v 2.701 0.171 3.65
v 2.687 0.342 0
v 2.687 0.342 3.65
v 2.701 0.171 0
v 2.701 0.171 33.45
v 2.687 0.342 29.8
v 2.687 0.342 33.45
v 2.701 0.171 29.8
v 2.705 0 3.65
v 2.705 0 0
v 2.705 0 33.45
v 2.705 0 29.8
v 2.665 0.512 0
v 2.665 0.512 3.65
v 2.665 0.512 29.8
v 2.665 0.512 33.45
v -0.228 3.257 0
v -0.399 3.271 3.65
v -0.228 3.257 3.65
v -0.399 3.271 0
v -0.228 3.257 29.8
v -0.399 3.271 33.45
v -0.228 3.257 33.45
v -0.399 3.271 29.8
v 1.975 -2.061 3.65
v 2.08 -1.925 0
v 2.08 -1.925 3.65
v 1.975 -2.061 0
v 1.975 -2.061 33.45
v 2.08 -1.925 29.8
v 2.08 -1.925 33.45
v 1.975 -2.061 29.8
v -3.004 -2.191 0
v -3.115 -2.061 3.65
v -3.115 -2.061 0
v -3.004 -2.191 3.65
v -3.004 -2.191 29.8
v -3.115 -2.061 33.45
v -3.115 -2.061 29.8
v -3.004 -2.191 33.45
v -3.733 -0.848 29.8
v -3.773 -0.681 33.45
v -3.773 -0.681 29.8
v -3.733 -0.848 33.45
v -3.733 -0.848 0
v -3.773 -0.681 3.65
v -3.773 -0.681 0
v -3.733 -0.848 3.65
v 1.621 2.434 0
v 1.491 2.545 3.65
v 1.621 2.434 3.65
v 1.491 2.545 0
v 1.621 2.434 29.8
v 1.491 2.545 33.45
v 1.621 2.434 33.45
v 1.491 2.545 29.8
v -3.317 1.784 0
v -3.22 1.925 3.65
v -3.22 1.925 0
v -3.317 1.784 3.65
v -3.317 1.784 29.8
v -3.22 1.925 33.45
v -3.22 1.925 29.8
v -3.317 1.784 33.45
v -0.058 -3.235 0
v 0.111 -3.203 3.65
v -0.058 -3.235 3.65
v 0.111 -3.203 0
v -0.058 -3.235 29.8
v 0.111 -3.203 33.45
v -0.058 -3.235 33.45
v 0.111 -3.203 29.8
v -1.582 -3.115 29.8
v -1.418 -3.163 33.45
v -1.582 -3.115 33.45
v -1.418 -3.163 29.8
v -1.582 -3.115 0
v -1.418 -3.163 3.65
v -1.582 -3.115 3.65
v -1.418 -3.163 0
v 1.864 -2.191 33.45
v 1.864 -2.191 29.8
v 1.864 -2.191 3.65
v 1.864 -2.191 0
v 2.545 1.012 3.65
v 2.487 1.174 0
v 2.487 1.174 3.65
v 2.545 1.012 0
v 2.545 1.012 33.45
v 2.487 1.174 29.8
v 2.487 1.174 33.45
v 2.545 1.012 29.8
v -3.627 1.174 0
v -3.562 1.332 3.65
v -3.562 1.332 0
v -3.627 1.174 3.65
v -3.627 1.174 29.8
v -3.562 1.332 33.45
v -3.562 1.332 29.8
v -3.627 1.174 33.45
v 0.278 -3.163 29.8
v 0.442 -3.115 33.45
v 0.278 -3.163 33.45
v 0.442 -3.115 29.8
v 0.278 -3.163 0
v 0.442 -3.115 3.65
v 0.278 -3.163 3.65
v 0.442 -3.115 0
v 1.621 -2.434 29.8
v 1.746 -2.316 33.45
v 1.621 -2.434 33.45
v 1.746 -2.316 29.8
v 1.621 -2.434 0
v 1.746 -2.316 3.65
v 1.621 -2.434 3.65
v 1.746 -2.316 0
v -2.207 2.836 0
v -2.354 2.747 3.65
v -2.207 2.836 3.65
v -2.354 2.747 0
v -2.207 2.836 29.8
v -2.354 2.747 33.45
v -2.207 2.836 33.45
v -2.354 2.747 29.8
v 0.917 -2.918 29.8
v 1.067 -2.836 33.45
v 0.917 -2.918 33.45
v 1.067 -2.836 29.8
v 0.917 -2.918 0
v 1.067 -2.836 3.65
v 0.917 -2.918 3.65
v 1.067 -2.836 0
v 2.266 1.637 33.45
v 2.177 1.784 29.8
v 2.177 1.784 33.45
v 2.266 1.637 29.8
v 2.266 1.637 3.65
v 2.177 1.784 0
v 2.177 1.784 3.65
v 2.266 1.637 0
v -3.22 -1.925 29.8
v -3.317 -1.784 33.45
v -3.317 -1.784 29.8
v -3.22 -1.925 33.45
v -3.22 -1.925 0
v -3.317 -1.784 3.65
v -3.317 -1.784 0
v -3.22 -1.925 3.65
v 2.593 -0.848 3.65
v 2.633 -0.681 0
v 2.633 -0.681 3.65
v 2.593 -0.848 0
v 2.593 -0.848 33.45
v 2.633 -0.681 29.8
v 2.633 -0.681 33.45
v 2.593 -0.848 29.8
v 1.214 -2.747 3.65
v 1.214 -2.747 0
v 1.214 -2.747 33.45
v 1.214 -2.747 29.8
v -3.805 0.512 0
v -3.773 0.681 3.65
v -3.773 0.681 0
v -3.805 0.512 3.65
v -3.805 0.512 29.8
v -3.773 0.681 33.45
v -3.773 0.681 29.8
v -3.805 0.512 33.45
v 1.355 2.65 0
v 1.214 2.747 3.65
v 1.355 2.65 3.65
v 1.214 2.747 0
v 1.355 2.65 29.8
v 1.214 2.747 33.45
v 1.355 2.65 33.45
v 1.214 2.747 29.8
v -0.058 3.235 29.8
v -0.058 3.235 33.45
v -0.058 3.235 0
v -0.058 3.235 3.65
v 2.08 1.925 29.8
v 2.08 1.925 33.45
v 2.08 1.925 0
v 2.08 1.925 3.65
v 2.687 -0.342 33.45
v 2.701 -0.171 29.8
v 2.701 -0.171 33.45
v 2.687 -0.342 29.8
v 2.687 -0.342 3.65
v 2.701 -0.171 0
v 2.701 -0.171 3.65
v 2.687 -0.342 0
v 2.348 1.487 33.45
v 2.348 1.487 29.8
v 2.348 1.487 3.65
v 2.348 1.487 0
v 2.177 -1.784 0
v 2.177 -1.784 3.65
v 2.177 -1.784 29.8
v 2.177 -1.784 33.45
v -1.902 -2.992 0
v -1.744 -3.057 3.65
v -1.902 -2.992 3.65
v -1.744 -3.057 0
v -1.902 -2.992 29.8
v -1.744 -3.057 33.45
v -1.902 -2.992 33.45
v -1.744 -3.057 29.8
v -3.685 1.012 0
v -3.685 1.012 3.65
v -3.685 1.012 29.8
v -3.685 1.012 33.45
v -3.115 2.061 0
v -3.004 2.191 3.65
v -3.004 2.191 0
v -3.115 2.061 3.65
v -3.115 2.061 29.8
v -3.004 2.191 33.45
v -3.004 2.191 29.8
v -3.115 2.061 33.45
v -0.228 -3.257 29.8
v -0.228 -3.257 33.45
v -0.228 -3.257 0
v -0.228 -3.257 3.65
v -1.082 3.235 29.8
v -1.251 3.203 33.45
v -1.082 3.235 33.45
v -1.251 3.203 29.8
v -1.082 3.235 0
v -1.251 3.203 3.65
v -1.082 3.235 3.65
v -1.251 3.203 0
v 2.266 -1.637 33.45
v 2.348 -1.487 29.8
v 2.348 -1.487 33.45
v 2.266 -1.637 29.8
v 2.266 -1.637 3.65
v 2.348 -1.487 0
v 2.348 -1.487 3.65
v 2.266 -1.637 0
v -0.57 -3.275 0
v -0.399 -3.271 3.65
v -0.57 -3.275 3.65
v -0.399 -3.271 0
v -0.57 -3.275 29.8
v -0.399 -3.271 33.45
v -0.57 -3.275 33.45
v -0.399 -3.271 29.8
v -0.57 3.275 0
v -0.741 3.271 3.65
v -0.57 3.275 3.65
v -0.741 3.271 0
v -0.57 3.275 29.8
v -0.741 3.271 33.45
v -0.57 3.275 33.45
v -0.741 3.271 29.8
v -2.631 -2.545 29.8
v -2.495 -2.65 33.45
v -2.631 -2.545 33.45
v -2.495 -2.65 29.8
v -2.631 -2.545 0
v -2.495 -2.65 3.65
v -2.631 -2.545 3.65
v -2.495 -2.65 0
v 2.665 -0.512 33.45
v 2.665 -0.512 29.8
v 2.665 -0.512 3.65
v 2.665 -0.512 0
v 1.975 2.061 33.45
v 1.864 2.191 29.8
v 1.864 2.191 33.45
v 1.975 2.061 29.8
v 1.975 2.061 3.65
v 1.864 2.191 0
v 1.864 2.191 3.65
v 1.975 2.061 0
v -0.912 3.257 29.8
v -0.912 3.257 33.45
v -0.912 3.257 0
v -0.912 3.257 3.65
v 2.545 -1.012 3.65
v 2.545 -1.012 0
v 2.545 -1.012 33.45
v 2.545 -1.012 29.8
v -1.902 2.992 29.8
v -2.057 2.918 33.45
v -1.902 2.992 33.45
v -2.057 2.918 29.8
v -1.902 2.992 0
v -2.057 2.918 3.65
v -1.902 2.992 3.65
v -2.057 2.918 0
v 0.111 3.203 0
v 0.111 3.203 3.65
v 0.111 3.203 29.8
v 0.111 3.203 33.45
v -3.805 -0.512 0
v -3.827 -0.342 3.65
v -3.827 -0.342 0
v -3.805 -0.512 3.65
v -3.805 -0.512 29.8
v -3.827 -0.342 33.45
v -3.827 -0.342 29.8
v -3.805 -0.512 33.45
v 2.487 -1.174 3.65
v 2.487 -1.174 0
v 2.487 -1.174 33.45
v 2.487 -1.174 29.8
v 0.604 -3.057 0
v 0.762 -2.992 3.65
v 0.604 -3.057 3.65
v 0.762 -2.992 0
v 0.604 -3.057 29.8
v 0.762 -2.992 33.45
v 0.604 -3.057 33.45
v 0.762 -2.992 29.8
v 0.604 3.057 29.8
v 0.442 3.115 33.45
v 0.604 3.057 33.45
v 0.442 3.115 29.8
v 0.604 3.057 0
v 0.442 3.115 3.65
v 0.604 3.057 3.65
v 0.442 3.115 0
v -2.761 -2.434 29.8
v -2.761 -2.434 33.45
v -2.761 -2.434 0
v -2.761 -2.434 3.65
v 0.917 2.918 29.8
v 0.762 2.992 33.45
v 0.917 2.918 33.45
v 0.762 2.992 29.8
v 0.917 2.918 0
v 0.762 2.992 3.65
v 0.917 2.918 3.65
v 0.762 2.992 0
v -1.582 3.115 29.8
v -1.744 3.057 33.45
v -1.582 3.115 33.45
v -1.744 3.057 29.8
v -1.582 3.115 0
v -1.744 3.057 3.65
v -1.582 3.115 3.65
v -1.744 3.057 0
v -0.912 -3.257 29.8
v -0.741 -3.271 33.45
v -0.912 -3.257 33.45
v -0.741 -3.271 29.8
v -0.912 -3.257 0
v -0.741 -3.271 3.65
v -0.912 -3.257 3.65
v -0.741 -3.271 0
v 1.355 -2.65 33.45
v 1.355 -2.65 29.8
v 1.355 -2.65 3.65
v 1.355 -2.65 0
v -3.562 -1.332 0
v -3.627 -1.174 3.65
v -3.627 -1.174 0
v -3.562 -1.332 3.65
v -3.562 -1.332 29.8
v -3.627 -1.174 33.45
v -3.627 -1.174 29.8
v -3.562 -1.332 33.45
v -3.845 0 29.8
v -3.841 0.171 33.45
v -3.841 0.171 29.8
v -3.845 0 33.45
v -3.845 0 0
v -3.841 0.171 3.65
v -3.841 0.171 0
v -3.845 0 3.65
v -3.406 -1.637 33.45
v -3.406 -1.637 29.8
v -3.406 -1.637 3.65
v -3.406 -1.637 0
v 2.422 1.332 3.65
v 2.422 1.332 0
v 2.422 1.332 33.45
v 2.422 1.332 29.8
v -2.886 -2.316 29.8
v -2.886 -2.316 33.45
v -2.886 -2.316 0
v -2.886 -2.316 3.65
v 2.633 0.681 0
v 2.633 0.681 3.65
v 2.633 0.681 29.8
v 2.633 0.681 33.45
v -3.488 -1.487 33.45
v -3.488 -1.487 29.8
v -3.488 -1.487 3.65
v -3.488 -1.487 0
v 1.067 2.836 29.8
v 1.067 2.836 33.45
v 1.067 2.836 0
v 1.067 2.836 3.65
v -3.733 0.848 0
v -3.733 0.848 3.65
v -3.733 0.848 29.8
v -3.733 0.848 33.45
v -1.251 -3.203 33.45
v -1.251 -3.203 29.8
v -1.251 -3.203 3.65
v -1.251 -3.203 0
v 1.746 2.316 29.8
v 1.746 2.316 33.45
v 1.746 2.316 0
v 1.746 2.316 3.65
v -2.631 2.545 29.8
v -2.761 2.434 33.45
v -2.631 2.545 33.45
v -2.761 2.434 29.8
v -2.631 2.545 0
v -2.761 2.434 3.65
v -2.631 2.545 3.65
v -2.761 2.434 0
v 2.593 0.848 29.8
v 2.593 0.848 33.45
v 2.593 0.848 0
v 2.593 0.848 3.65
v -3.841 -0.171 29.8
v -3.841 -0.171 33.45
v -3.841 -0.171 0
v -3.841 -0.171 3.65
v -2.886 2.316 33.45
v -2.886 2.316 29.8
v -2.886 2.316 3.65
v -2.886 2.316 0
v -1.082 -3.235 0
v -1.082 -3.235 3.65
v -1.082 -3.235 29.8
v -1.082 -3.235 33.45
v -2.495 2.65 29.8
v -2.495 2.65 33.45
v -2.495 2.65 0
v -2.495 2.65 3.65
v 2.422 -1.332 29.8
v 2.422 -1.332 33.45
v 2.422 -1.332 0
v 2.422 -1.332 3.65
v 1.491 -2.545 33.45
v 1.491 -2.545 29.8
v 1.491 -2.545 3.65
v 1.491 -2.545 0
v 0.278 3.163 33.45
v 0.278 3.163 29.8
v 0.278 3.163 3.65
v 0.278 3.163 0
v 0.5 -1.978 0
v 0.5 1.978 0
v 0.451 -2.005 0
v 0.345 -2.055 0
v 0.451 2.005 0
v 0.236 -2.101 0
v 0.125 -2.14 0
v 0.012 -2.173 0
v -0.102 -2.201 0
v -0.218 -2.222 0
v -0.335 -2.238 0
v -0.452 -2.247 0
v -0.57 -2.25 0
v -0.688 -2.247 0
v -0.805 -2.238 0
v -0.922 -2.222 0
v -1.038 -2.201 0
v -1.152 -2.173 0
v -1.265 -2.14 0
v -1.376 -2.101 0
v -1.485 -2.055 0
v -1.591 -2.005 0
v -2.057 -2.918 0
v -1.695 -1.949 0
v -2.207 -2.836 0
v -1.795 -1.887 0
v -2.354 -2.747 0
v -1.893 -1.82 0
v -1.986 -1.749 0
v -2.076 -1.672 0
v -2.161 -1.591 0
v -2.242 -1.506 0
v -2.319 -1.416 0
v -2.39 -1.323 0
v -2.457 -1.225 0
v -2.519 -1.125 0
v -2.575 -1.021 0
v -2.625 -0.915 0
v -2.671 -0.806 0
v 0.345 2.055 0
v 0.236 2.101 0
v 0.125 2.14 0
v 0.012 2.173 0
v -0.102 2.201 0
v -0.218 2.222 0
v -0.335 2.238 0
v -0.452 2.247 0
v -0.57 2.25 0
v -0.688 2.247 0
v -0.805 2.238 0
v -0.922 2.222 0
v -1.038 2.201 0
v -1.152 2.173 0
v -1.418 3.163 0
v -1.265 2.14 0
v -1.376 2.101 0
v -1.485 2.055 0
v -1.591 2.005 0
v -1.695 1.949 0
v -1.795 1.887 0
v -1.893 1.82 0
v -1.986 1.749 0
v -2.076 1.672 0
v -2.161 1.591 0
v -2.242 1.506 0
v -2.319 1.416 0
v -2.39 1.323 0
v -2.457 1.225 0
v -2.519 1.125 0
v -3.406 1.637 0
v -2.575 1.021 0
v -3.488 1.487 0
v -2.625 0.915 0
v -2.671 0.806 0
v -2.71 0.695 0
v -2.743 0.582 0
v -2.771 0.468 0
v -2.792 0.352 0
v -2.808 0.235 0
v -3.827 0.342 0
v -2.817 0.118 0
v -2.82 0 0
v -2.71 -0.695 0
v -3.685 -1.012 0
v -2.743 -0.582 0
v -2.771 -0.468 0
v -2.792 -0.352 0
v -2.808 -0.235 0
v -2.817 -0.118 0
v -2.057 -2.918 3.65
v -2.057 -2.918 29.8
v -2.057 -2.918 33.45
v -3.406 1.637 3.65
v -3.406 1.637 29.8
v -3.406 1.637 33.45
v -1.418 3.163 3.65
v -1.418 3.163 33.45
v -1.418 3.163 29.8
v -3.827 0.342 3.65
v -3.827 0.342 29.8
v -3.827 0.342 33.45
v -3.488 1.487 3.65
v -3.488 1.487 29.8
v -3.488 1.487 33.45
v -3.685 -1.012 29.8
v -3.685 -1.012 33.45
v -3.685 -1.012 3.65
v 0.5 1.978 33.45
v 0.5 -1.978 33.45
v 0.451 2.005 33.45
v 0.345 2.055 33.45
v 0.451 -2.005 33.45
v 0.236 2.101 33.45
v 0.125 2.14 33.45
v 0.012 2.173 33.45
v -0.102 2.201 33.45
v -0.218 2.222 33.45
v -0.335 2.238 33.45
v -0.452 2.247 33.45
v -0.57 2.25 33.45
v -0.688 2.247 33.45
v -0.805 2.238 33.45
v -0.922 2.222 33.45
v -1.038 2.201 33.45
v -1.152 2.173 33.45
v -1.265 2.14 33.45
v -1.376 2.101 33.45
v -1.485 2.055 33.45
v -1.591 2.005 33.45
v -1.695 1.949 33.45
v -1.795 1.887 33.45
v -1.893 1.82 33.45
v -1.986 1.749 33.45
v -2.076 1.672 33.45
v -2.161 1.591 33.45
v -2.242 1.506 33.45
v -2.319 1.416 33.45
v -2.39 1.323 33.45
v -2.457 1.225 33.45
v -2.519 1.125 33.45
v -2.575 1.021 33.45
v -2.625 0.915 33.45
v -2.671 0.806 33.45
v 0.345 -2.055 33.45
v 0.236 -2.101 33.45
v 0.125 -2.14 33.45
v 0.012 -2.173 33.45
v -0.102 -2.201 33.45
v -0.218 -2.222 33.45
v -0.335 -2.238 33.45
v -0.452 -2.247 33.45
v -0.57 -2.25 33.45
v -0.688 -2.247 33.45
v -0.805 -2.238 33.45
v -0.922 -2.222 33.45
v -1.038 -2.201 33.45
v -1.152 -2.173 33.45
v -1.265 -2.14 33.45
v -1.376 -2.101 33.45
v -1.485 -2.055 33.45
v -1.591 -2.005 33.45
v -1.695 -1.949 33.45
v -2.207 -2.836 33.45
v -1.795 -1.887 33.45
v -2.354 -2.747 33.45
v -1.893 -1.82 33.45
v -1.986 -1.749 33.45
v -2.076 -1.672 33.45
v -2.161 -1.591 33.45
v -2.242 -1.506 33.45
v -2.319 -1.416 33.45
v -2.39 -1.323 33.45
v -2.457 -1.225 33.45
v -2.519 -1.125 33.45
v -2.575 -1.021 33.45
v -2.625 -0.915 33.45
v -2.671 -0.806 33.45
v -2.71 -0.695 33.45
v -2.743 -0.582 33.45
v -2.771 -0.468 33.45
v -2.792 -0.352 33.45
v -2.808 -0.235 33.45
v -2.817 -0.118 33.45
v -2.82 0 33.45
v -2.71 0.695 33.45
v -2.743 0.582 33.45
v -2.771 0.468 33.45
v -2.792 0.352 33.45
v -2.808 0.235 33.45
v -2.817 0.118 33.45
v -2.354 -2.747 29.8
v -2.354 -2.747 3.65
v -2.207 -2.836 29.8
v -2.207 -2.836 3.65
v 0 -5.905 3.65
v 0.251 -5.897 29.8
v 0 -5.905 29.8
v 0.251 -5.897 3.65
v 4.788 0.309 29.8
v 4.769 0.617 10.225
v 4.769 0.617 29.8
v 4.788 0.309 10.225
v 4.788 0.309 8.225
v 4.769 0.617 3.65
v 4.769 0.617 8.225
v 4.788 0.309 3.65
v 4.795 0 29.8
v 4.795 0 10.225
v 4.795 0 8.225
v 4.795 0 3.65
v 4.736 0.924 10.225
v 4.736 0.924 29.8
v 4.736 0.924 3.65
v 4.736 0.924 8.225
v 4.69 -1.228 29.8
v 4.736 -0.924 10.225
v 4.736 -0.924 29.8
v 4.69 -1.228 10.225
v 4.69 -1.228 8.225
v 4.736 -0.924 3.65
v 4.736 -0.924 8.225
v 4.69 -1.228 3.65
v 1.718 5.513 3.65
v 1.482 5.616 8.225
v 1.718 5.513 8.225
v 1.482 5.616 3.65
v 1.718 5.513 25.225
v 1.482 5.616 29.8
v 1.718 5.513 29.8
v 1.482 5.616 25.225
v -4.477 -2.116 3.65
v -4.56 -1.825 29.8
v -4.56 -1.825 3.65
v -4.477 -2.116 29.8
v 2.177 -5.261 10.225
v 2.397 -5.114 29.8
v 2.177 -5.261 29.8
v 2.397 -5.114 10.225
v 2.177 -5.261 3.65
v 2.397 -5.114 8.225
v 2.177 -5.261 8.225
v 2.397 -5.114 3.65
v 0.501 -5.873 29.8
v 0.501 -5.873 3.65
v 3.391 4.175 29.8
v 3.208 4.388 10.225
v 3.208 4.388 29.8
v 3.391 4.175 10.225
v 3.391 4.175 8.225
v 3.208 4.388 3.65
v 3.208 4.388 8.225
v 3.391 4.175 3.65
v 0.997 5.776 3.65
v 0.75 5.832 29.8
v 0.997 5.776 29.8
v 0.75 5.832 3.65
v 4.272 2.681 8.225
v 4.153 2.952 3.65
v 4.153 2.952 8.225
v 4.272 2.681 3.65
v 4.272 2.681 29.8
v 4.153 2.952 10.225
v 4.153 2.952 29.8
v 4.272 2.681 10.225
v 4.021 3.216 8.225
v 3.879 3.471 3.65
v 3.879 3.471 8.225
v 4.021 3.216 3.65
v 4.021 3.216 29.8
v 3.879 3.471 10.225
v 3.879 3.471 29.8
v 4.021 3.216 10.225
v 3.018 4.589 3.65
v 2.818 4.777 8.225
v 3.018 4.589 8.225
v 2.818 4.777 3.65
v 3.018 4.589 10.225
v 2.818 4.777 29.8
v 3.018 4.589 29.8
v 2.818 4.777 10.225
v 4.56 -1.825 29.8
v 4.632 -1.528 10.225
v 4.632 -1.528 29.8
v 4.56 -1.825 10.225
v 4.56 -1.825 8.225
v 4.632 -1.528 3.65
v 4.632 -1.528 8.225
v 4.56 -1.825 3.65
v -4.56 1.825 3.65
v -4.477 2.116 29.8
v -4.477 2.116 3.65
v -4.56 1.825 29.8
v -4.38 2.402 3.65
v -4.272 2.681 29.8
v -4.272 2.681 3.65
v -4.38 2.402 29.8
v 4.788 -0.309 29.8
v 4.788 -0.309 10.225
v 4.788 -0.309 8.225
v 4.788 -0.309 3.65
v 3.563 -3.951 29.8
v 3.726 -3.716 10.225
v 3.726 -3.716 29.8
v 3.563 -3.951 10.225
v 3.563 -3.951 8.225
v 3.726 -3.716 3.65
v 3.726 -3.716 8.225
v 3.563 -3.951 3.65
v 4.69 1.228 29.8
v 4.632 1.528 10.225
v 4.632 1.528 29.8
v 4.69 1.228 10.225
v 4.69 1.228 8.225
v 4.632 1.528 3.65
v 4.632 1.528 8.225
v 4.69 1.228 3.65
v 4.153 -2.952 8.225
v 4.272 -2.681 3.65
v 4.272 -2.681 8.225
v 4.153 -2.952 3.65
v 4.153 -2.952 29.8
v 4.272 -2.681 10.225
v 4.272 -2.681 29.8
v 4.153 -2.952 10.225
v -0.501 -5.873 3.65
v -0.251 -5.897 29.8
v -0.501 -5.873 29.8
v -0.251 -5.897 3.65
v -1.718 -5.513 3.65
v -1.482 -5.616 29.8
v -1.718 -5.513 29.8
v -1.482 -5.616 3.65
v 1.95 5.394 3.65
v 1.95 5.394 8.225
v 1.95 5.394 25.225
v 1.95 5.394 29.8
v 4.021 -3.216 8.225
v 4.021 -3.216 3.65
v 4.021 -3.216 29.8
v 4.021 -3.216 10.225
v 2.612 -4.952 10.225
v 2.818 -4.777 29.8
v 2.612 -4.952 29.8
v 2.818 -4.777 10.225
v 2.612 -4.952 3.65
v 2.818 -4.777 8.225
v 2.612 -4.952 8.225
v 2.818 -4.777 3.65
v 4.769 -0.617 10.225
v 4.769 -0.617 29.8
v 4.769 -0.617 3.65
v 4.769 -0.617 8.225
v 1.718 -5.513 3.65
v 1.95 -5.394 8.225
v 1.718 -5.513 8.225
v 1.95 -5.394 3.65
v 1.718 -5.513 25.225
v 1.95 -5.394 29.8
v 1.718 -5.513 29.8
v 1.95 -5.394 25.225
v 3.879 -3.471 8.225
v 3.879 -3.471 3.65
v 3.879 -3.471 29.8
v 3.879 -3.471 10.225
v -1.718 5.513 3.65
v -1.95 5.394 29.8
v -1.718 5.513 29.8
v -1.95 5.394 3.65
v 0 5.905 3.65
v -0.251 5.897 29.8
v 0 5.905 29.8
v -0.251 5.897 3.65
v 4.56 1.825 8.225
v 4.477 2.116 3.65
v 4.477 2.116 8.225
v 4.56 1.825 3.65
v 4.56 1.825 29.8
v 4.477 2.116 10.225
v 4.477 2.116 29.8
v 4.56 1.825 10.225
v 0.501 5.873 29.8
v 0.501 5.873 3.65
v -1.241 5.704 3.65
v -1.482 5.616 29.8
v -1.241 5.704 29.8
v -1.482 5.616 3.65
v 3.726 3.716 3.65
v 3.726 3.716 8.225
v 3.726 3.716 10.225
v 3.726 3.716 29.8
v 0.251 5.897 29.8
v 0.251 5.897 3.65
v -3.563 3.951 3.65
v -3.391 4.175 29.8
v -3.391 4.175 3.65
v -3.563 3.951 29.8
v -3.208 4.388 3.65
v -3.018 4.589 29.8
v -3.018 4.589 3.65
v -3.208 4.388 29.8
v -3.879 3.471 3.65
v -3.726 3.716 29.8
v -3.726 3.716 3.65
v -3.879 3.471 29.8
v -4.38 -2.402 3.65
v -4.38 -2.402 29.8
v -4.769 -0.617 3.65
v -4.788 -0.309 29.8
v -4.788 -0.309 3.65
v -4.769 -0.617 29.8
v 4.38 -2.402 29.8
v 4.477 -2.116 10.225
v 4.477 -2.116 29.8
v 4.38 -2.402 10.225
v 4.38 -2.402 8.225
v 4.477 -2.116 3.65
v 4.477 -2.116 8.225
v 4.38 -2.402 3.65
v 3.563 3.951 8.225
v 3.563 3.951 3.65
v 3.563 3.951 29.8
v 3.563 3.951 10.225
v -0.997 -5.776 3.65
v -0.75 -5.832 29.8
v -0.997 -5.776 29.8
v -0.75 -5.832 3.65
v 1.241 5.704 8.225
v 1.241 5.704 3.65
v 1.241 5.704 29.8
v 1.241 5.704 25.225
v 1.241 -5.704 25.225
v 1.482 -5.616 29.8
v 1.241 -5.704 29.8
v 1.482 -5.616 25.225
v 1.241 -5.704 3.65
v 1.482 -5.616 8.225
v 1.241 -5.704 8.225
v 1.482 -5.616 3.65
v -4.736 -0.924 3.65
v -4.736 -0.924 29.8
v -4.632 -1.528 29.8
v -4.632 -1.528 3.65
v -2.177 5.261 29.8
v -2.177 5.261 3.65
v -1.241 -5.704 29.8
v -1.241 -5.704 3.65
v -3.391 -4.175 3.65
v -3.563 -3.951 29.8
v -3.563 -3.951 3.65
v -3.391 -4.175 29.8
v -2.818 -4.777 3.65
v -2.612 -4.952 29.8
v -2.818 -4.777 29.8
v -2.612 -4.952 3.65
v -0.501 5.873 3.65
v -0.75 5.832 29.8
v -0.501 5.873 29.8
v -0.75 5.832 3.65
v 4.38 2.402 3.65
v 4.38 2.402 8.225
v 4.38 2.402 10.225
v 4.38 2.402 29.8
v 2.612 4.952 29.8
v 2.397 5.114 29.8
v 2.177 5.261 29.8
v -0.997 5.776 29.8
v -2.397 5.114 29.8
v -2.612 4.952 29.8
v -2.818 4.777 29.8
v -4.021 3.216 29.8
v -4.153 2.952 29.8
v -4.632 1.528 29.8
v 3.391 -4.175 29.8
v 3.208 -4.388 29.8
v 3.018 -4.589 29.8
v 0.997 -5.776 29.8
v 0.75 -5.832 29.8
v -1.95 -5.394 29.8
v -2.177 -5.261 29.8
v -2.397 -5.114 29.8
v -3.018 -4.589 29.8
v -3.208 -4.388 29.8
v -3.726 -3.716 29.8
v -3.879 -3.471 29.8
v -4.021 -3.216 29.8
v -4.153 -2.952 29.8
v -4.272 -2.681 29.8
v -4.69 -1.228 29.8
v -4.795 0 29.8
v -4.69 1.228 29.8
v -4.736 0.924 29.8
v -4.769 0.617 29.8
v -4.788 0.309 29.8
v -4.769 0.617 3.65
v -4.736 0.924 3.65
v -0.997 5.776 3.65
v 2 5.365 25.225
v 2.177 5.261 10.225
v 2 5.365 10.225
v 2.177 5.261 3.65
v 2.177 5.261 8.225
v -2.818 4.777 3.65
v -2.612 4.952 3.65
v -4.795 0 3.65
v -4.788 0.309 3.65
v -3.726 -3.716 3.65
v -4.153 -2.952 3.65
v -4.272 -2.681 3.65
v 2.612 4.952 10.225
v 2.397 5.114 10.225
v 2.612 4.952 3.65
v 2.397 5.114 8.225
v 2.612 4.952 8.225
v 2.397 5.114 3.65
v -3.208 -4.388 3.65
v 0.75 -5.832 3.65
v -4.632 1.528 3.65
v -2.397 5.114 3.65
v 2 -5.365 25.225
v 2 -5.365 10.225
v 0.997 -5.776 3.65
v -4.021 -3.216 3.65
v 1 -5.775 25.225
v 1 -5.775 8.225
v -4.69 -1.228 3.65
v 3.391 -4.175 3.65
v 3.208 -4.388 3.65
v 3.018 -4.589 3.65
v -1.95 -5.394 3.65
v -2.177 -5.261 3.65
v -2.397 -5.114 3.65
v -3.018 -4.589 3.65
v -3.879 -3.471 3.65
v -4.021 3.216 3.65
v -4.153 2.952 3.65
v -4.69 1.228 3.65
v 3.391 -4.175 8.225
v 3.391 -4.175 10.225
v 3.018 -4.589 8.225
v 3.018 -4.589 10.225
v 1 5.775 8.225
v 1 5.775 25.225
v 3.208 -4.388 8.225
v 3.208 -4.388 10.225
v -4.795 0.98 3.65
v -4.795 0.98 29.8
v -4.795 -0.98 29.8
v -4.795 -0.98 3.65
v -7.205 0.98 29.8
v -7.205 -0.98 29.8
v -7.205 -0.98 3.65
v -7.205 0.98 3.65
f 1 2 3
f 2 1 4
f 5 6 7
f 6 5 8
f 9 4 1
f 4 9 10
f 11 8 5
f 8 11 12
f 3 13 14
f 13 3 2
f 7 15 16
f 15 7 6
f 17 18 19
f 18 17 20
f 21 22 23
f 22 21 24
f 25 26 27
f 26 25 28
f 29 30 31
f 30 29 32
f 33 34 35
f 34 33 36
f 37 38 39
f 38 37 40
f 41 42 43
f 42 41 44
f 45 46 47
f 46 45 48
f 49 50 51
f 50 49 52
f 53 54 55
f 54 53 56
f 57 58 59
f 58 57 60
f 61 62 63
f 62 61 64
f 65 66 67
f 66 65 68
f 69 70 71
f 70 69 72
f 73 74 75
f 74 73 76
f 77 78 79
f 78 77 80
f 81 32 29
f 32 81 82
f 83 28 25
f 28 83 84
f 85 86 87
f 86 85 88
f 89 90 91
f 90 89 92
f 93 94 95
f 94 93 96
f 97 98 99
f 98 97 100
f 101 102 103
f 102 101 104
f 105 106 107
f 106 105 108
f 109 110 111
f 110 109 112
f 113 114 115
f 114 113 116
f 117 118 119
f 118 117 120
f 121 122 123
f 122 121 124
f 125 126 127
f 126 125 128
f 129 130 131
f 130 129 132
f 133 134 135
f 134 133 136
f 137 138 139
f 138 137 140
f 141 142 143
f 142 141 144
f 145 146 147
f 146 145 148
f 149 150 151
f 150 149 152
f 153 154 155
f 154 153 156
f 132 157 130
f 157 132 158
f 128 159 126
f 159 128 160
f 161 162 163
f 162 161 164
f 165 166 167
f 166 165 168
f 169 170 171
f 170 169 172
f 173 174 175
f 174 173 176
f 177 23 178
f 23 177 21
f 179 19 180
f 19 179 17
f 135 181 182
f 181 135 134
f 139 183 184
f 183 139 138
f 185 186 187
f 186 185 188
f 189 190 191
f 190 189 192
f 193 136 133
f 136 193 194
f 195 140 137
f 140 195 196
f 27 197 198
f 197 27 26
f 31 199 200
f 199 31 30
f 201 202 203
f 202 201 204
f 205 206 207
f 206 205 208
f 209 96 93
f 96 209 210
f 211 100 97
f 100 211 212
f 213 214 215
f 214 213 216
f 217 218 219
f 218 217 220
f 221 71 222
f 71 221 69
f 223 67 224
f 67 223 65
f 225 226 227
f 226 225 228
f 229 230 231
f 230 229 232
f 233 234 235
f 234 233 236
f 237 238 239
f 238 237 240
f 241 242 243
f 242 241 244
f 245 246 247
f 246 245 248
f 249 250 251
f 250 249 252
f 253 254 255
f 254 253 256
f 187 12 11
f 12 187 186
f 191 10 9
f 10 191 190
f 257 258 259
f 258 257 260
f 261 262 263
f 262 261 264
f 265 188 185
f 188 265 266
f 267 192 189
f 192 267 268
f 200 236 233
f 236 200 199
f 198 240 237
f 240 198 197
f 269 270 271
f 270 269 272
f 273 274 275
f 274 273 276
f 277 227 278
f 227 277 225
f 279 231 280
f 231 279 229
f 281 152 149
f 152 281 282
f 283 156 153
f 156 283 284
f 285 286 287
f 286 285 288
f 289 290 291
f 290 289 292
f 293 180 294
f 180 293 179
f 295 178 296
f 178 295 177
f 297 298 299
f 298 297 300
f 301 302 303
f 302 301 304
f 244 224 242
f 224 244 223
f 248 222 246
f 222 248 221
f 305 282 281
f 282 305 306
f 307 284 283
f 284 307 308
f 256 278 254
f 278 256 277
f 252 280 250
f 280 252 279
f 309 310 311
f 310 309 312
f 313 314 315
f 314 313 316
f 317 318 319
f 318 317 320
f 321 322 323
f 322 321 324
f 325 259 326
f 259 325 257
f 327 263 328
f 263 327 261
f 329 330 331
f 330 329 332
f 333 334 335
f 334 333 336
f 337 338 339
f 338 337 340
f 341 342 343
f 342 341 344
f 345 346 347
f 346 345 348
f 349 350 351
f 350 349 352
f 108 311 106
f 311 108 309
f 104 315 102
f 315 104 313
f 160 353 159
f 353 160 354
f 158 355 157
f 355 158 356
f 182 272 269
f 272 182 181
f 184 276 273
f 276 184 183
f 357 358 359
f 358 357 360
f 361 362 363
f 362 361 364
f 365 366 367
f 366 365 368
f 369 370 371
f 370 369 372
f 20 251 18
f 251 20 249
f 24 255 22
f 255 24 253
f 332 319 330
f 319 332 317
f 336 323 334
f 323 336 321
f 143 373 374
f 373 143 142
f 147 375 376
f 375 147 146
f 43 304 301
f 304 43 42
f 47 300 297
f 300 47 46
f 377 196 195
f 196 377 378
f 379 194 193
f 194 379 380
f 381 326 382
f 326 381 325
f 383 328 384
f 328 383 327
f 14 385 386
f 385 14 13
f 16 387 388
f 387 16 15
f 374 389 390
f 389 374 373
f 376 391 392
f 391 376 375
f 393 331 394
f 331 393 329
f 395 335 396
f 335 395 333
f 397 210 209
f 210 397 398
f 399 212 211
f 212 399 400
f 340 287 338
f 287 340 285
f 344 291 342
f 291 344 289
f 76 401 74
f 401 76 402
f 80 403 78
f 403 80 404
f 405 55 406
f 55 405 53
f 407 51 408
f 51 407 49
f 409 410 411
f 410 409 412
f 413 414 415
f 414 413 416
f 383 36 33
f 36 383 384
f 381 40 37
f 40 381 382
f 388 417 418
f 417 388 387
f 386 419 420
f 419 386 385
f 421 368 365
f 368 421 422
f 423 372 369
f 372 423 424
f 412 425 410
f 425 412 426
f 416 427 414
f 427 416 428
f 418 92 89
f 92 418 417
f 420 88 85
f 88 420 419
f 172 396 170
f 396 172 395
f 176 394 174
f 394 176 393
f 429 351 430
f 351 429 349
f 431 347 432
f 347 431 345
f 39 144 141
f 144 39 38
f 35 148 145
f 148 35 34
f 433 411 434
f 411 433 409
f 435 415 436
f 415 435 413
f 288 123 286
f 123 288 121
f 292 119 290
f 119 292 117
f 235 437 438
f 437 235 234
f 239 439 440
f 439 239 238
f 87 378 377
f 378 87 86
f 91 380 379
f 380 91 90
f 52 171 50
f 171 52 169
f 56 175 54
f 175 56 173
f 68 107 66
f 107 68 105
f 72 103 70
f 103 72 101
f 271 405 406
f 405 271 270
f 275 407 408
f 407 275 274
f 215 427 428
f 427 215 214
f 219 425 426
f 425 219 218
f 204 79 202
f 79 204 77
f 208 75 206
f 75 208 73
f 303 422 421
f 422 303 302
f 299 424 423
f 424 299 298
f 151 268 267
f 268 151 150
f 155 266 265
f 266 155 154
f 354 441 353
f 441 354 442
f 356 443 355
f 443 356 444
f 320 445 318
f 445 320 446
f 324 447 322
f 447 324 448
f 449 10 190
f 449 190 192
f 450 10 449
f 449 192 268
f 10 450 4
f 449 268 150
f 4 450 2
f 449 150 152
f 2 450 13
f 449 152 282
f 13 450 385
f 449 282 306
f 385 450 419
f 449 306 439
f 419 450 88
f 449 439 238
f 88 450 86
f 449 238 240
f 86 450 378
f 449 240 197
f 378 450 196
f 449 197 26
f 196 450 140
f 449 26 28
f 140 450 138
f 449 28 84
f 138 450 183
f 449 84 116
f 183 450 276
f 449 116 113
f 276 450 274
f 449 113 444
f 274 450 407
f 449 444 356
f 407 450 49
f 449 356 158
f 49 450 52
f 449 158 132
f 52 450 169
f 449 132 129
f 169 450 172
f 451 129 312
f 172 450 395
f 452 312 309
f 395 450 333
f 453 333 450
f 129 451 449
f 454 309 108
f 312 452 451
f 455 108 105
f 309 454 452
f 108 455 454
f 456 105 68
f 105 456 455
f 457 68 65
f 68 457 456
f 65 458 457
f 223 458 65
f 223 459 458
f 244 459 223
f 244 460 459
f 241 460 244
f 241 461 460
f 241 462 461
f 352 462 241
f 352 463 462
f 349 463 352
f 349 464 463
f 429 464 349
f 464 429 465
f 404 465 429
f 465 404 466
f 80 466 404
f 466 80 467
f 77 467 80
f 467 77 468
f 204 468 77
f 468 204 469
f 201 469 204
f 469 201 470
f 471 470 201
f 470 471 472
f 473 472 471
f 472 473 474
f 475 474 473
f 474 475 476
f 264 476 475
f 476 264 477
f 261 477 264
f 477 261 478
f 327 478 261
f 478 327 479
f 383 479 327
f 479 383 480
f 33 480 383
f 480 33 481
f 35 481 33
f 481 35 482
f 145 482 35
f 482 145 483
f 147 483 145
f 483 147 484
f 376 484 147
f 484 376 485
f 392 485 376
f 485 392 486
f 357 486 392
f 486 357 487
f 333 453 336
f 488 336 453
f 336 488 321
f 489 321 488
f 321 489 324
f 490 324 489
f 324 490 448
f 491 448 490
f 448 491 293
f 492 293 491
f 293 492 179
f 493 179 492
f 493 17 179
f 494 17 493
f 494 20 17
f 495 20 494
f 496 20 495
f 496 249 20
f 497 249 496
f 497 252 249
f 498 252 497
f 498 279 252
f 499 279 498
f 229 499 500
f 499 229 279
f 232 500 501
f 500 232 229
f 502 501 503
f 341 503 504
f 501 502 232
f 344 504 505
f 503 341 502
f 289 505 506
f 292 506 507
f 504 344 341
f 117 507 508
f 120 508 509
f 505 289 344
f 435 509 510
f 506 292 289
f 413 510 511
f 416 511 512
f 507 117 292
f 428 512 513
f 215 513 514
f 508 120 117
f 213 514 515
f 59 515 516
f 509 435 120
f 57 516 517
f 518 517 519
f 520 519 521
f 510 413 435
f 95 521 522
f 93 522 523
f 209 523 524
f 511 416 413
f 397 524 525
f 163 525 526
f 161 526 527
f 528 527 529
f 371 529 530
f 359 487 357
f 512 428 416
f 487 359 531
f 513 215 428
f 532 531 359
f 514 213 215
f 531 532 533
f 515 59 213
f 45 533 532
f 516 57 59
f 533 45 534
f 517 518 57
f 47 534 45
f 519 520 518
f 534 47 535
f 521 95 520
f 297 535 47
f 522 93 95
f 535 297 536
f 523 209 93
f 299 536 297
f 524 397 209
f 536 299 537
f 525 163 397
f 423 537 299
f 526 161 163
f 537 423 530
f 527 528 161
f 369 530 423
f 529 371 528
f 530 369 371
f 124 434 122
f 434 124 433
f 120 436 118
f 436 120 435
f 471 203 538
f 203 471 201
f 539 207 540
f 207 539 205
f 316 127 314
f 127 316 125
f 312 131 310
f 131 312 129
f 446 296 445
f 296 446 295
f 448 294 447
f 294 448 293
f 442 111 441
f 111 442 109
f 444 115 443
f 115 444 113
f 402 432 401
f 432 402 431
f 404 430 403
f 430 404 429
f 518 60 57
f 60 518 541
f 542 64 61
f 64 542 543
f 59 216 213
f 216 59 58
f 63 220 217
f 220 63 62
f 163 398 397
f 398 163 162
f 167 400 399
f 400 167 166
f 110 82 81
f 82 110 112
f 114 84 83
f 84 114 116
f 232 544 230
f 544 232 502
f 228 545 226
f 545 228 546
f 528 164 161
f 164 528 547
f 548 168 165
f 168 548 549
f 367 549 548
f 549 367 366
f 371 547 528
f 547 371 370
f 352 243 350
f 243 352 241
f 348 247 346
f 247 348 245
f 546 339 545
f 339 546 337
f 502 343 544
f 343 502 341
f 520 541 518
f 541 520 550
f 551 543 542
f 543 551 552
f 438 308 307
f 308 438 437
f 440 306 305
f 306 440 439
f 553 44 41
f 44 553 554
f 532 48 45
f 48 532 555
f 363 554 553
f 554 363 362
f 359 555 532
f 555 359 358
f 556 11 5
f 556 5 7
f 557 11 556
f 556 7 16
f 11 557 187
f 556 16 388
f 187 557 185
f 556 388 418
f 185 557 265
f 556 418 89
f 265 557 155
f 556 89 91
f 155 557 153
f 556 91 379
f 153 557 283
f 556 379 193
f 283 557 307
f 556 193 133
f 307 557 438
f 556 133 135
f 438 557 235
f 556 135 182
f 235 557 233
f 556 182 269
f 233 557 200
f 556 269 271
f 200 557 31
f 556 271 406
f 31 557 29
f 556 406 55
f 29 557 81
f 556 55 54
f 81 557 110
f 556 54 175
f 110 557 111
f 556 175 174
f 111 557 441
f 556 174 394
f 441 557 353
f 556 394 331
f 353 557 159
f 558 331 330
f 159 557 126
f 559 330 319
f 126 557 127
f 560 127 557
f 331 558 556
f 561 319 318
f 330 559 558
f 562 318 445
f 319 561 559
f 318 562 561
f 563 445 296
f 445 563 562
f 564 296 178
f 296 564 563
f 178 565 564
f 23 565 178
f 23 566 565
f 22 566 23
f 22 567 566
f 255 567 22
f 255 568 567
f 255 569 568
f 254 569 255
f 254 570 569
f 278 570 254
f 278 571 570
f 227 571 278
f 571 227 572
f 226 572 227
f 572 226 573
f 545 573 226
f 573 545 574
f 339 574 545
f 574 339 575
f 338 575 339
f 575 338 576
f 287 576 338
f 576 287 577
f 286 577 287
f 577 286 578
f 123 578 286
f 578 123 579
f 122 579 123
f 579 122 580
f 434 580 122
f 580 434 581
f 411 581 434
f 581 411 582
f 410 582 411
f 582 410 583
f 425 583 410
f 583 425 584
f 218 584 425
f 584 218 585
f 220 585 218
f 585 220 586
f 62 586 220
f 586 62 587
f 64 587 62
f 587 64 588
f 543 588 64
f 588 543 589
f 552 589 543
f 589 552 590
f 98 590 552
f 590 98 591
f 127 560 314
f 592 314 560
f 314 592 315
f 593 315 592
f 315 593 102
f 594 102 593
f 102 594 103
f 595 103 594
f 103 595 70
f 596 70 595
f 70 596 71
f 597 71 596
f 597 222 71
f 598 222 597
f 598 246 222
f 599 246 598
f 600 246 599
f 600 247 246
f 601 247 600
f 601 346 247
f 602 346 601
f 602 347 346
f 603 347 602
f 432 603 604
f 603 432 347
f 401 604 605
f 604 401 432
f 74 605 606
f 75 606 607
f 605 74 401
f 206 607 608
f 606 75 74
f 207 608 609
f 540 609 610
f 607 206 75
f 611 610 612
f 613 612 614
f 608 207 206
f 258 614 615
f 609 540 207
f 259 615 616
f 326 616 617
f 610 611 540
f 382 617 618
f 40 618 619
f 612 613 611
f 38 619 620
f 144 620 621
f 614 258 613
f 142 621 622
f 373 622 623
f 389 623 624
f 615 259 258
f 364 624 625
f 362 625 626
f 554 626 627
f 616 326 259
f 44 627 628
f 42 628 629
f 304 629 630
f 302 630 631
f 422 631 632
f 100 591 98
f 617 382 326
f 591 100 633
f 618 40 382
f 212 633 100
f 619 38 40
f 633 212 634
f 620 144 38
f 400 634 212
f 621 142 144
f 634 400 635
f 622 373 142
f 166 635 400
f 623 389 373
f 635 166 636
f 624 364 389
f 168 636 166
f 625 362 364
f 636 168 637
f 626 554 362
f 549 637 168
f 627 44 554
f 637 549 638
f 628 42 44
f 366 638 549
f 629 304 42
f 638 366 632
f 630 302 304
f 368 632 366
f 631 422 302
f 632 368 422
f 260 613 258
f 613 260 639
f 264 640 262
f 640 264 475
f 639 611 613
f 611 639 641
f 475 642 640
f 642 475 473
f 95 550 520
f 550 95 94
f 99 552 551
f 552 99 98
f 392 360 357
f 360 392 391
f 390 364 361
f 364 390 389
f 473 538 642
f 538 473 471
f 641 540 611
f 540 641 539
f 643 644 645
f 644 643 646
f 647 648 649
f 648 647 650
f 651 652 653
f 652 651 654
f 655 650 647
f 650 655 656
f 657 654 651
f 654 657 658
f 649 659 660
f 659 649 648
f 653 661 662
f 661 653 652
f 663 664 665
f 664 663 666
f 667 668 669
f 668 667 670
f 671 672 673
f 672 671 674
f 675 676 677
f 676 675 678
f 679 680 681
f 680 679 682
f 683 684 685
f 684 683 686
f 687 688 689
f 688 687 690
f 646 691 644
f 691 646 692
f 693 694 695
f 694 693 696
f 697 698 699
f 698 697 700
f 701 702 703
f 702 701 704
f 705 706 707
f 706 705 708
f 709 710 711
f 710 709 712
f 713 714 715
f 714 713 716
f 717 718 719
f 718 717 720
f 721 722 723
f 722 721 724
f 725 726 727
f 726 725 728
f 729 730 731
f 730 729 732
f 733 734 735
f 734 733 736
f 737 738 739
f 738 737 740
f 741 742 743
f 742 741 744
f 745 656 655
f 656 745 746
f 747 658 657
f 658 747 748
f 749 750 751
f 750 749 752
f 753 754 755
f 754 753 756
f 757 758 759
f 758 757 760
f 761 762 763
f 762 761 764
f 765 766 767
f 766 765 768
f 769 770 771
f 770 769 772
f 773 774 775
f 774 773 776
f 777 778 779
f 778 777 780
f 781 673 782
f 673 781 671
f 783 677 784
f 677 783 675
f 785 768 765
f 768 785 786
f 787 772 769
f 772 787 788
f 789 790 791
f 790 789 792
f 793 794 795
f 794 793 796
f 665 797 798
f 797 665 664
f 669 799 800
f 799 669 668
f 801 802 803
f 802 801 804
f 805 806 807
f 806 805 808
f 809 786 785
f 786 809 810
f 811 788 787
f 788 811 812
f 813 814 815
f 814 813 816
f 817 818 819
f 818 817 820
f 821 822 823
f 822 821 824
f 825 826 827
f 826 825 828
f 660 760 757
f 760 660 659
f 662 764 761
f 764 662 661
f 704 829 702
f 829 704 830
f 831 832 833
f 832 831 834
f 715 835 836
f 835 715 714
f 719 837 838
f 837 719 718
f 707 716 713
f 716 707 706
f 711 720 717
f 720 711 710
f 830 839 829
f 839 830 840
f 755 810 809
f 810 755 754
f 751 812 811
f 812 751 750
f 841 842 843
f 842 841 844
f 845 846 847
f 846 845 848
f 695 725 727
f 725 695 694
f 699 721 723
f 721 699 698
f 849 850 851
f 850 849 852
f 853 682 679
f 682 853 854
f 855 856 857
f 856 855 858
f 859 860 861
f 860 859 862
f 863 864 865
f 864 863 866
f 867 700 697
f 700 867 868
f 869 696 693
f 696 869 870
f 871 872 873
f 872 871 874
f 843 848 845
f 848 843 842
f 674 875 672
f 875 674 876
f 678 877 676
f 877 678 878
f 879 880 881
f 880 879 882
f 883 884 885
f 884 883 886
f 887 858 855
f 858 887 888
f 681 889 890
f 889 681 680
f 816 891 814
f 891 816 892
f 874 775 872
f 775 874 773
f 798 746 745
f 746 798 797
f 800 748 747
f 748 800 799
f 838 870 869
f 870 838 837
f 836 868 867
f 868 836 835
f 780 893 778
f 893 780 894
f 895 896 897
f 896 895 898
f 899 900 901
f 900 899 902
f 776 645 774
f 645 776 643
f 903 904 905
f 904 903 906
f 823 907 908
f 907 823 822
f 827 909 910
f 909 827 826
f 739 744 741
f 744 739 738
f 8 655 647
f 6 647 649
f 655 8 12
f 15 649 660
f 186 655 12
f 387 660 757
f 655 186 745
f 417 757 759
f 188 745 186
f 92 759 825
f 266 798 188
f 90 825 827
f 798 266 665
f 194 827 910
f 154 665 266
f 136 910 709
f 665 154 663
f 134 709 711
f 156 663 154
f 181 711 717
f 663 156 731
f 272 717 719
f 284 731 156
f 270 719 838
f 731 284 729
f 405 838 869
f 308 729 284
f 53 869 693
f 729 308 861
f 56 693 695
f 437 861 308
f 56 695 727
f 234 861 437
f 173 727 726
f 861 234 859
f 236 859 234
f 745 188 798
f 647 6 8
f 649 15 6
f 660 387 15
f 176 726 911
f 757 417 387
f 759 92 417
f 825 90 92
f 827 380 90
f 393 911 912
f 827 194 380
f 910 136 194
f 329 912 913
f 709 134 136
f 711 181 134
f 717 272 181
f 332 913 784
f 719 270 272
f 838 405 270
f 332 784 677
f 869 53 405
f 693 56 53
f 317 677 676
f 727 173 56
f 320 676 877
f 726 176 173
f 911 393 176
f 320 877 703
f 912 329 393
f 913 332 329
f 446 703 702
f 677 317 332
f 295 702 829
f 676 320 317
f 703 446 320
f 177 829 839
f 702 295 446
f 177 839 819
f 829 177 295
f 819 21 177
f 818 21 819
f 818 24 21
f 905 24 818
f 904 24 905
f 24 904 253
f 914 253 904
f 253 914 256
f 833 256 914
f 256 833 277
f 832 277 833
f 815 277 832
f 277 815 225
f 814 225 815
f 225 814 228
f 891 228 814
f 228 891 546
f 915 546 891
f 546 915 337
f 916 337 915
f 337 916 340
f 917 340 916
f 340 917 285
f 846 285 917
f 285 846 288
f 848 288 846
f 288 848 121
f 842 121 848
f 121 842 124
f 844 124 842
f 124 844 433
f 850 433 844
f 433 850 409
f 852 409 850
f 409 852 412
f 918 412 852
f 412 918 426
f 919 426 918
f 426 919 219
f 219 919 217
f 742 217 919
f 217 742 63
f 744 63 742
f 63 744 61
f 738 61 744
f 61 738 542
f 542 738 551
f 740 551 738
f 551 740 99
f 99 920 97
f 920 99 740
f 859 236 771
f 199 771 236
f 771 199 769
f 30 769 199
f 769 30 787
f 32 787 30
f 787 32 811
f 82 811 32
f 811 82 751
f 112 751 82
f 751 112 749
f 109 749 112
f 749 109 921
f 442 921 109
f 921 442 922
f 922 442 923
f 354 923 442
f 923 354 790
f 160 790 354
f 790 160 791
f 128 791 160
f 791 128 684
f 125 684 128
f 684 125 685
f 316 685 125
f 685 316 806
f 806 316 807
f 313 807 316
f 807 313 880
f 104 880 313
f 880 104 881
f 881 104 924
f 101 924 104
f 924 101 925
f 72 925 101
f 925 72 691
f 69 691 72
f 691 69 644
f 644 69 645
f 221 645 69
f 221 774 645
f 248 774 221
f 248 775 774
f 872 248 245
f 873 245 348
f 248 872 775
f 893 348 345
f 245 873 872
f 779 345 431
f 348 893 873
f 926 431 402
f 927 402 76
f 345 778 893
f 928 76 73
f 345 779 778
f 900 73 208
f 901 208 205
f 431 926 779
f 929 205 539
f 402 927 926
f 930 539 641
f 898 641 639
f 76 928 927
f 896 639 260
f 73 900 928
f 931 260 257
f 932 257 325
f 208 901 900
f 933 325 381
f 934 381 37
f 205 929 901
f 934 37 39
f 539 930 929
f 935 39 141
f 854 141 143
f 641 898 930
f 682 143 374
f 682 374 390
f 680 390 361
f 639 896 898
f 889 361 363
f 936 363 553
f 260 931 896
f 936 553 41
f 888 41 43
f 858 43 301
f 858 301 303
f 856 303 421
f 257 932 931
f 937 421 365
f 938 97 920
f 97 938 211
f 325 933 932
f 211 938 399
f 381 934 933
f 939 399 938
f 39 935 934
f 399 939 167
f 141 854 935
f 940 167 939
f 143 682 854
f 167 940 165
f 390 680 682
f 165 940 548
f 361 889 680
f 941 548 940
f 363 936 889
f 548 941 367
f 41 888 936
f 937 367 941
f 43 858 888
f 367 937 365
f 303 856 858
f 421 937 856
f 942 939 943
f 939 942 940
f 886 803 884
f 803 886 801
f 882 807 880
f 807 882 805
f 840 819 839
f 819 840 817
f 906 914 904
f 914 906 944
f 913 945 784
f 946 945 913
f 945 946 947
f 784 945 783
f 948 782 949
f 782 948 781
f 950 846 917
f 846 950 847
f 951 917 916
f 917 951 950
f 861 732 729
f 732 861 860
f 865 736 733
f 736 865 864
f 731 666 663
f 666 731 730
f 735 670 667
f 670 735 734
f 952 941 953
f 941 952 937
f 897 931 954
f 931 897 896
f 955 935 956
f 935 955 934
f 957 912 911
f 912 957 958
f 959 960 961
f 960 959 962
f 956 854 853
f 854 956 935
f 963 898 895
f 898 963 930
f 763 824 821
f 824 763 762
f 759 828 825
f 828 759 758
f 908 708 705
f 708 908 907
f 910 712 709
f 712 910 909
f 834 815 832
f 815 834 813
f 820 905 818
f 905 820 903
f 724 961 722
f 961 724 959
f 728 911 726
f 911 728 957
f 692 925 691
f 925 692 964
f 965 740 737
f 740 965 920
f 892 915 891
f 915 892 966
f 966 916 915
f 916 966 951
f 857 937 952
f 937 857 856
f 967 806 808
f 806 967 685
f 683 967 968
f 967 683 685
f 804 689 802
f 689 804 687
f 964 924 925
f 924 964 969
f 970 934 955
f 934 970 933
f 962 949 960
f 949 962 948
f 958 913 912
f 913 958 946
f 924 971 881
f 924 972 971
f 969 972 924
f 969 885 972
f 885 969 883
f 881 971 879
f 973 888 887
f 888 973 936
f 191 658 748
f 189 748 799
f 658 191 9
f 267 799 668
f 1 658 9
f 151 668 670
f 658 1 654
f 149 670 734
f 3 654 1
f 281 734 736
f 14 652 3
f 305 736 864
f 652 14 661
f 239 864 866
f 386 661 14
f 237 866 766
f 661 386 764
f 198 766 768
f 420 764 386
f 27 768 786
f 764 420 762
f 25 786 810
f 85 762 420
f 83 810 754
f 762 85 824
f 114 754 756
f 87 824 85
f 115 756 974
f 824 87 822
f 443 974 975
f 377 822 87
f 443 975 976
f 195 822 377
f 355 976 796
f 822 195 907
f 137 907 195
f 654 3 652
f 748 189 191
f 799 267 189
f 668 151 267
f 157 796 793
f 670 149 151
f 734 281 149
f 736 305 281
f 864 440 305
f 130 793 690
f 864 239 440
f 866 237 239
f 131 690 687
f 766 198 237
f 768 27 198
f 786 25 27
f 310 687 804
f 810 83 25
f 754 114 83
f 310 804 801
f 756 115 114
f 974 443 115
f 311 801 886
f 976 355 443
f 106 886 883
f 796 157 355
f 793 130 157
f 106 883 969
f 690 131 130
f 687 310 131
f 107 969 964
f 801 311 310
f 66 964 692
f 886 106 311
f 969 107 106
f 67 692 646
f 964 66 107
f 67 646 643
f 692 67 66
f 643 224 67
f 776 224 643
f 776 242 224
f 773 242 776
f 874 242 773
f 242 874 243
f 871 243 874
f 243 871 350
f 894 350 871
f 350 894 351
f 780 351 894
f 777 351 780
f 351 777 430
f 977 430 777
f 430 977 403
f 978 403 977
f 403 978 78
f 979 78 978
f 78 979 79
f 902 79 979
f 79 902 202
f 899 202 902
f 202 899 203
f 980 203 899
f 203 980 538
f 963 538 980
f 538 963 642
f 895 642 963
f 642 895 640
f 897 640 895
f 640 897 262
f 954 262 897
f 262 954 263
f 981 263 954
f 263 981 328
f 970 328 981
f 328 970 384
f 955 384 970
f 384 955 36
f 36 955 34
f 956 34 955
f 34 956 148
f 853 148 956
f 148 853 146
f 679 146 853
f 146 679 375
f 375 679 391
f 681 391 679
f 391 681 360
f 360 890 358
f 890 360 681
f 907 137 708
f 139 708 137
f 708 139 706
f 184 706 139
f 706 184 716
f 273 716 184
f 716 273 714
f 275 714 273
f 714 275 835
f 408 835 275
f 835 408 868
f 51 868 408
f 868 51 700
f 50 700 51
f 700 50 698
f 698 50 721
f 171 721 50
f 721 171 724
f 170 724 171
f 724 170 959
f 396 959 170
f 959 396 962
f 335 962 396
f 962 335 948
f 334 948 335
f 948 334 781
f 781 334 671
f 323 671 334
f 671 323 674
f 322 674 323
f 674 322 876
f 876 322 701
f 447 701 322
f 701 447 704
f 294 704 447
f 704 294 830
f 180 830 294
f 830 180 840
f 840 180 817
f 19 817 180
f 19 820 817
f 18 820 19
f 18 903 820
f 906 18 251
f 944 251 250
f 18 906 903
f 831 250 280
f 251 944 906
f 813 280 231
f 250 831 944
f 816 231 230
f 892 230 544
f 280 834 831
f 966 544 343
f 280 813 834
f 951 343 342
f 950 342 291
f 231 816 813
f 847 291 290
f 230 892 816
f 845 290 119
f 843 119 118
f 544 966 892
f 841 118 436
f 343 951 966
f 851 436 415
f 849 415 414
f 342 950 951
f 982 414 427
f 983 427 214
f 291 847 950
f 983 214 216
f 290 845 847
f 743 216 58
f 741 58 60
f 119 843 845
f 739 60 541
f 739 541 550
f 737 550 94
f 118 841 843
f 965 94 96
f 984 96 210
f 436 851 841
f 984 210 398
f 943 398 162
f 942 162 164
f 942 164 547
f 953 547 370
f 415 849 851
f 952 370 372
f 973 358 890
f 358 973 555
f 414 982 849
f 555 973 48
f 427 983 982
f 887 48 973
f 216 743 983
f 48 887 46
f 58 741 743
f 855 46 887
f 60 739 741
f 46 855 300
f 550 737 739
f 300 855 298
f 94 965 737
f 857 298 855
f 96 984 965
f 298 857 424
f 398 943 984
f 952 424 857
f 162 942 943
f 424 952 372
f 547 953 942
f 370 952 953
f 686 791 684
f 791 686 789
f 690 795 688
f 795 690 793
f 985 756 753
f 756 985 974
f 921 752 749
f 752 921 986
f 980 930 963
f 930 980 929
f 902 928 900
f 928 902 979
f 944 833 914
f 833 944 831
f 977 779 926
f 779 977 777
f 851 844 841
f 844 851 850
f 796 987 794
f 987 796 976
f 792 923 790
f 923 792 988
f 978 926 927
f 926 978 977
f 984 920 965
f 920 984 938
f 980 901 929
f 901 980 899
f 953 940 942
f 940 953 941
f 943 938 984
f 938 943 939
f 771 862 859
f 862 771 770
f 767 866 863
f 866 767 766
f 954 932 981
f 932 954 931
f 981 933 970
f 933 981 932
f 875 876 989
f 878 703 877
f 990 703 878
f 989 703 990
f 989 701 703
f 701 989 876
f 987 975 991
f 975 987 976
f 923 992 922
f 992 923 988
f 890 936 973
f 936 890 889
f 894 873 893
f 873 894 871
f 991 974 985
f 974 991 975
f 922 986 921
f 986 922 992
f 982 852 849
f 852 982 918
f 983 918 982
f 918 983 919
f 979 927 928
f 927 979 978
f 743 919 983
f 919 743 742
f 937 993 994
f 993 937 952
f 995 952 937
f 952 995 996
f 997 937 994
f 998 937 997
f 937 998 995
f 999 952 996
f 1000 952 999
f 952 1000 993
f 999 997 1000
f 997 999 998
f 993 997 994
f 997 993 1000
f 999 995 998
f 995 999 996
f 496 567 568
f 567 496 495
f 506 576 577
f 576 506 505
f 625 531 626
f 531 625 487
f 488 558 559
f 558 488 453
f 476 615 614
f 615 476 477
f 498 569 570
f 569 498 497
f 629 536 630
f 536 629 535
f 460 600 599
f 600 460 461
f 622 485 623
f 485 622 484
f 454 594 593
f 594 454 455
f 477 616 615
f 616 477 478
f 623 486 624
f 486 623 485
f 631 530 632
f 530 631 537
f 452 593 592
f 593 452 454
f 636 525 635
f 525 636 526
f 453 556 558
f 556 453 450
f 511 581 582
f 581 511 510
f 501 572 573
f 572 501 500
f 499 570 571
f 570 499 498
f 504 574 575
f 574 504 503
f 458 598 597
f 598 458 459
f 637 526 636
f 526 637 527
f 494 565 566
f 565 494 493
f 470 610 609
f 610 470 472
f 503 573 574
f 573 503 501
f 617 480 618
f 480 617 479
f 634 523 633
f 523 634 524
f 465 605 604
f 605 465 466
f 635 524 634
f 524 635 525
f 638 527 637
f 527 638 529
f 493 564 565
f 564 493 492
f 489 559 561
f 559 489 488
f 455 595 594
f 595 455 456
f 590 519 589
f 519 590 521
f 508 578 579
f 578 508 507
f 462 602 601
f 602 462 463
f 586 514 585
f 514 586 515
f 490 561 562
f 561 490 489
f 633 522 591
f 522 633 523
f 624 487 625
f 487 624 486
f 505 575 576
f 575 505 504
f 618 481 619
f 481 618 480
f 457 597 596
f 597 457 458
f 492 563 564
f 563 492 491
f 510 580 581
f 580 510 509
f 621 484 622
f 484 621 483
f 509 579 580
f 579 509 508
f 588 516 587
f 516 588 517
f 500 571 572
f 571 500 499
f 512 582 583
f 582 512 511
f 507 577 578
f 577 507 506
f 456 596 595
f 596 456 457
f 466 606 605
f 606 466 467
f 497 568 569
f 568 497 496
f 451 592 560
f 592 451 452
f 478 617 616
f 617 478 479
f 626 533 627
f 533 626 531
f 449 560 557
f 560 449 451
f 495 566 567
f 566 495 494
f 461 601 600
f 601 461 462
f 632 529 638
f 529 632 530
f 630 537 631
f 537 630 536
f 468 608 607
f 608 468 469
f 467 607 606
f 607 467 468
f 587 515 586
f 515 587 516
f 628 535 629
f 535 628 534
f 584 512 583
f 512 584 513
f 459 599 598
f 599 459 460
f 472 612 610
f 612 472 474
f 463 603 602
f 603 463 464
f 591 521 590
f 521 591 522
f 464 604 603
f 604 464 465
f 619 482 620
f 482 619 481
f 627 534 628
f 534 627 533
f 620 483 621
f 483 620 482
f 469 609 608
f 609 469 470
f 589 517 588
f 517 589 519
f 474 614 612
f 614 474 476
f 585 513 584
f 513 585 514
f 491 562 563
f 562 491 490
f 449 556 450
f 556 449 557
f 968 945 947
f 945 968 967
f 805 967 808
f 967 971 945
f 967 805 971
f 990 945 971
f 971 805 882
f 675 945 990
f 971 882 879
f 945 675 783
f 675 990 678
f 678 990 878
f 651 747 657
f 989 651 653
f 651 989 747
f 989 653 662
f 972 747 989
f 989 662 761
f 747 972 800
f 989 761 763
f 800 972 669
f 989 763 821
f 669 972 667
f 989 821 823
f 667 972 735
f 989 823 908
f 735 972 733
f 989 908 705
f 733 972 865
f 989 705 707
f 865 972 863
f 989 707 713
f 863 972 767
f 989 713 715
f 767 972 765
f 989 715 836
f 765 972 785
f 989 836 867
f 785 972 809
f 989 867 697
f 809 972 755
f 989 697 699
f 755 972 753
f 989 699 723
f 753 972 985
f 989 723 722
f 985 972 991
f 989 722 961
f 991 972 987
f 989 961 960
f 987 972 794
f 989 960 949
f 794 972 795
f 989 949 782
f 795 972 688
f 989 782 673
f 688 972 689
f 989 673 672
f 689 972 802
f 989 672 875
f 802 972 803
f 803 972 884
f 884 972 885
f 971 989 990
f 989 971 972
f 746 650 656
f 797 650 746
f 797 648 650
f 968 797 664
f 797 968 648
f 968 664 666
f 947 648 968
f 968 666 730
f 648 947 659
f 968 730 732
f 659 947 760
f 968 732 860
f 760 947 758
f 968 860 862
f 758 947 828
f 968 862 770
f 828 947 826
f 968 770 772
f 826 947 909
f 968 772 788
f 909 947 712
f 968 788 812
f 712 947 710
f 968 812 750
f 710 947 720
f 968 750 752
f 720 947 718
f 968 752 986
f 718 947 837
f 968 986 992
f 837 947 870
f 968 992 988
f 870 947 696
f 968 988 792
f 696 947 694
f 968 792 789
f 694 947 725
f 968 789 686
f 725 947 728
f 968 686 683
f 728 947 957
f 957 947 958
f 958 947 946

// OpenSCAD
nub=3.65;
mainHeight=26.15;
mainDiaMajor=11.81;
mainDiaMinor=9.59;

ridgeDepth=12-mainDiaMinor;
ridgeWidth=1.96;

offset=.57;

e=0.01;
holeTolerance=0.5;
$fn=120;

difference() {
    union() {
        translate([-offset,0,0]) cylinder(h=mainHeight+nub*2, d=6.55);
        translate([0,0,nub])
            resize([mainDiaMinor,mainDiaMajor,mainHeight])
            cylinder(h=mainHeight,d=mainDiaMajor);
        translate([-mainDiaMinor/2-ridgeDepth,-ridgeWidth/2,nub]) cube([ridgeDepth,ridgeWidth,mainHeight]);
    }
    union() {
        difference() {
            translate([-offset,0,-e]) cylinder(h=mainHeight+nub*2+2*e, d=4+holeTolerance);
            translate([holeTolerance,-5,-e*2]) cube([10,10,mainHeight+nub*2+2*e]);
        }
        insert();
    }
}


insertHeight=17;
module insert() {
    translate([1,-15,(2*nub+mainHeight-insertHeight)/2]) cube([1,30,insertHeight]);
    translate([1,-15,(2*nub+mainHeight-insertHeight)/2]) cube([20,30,2]);
}
